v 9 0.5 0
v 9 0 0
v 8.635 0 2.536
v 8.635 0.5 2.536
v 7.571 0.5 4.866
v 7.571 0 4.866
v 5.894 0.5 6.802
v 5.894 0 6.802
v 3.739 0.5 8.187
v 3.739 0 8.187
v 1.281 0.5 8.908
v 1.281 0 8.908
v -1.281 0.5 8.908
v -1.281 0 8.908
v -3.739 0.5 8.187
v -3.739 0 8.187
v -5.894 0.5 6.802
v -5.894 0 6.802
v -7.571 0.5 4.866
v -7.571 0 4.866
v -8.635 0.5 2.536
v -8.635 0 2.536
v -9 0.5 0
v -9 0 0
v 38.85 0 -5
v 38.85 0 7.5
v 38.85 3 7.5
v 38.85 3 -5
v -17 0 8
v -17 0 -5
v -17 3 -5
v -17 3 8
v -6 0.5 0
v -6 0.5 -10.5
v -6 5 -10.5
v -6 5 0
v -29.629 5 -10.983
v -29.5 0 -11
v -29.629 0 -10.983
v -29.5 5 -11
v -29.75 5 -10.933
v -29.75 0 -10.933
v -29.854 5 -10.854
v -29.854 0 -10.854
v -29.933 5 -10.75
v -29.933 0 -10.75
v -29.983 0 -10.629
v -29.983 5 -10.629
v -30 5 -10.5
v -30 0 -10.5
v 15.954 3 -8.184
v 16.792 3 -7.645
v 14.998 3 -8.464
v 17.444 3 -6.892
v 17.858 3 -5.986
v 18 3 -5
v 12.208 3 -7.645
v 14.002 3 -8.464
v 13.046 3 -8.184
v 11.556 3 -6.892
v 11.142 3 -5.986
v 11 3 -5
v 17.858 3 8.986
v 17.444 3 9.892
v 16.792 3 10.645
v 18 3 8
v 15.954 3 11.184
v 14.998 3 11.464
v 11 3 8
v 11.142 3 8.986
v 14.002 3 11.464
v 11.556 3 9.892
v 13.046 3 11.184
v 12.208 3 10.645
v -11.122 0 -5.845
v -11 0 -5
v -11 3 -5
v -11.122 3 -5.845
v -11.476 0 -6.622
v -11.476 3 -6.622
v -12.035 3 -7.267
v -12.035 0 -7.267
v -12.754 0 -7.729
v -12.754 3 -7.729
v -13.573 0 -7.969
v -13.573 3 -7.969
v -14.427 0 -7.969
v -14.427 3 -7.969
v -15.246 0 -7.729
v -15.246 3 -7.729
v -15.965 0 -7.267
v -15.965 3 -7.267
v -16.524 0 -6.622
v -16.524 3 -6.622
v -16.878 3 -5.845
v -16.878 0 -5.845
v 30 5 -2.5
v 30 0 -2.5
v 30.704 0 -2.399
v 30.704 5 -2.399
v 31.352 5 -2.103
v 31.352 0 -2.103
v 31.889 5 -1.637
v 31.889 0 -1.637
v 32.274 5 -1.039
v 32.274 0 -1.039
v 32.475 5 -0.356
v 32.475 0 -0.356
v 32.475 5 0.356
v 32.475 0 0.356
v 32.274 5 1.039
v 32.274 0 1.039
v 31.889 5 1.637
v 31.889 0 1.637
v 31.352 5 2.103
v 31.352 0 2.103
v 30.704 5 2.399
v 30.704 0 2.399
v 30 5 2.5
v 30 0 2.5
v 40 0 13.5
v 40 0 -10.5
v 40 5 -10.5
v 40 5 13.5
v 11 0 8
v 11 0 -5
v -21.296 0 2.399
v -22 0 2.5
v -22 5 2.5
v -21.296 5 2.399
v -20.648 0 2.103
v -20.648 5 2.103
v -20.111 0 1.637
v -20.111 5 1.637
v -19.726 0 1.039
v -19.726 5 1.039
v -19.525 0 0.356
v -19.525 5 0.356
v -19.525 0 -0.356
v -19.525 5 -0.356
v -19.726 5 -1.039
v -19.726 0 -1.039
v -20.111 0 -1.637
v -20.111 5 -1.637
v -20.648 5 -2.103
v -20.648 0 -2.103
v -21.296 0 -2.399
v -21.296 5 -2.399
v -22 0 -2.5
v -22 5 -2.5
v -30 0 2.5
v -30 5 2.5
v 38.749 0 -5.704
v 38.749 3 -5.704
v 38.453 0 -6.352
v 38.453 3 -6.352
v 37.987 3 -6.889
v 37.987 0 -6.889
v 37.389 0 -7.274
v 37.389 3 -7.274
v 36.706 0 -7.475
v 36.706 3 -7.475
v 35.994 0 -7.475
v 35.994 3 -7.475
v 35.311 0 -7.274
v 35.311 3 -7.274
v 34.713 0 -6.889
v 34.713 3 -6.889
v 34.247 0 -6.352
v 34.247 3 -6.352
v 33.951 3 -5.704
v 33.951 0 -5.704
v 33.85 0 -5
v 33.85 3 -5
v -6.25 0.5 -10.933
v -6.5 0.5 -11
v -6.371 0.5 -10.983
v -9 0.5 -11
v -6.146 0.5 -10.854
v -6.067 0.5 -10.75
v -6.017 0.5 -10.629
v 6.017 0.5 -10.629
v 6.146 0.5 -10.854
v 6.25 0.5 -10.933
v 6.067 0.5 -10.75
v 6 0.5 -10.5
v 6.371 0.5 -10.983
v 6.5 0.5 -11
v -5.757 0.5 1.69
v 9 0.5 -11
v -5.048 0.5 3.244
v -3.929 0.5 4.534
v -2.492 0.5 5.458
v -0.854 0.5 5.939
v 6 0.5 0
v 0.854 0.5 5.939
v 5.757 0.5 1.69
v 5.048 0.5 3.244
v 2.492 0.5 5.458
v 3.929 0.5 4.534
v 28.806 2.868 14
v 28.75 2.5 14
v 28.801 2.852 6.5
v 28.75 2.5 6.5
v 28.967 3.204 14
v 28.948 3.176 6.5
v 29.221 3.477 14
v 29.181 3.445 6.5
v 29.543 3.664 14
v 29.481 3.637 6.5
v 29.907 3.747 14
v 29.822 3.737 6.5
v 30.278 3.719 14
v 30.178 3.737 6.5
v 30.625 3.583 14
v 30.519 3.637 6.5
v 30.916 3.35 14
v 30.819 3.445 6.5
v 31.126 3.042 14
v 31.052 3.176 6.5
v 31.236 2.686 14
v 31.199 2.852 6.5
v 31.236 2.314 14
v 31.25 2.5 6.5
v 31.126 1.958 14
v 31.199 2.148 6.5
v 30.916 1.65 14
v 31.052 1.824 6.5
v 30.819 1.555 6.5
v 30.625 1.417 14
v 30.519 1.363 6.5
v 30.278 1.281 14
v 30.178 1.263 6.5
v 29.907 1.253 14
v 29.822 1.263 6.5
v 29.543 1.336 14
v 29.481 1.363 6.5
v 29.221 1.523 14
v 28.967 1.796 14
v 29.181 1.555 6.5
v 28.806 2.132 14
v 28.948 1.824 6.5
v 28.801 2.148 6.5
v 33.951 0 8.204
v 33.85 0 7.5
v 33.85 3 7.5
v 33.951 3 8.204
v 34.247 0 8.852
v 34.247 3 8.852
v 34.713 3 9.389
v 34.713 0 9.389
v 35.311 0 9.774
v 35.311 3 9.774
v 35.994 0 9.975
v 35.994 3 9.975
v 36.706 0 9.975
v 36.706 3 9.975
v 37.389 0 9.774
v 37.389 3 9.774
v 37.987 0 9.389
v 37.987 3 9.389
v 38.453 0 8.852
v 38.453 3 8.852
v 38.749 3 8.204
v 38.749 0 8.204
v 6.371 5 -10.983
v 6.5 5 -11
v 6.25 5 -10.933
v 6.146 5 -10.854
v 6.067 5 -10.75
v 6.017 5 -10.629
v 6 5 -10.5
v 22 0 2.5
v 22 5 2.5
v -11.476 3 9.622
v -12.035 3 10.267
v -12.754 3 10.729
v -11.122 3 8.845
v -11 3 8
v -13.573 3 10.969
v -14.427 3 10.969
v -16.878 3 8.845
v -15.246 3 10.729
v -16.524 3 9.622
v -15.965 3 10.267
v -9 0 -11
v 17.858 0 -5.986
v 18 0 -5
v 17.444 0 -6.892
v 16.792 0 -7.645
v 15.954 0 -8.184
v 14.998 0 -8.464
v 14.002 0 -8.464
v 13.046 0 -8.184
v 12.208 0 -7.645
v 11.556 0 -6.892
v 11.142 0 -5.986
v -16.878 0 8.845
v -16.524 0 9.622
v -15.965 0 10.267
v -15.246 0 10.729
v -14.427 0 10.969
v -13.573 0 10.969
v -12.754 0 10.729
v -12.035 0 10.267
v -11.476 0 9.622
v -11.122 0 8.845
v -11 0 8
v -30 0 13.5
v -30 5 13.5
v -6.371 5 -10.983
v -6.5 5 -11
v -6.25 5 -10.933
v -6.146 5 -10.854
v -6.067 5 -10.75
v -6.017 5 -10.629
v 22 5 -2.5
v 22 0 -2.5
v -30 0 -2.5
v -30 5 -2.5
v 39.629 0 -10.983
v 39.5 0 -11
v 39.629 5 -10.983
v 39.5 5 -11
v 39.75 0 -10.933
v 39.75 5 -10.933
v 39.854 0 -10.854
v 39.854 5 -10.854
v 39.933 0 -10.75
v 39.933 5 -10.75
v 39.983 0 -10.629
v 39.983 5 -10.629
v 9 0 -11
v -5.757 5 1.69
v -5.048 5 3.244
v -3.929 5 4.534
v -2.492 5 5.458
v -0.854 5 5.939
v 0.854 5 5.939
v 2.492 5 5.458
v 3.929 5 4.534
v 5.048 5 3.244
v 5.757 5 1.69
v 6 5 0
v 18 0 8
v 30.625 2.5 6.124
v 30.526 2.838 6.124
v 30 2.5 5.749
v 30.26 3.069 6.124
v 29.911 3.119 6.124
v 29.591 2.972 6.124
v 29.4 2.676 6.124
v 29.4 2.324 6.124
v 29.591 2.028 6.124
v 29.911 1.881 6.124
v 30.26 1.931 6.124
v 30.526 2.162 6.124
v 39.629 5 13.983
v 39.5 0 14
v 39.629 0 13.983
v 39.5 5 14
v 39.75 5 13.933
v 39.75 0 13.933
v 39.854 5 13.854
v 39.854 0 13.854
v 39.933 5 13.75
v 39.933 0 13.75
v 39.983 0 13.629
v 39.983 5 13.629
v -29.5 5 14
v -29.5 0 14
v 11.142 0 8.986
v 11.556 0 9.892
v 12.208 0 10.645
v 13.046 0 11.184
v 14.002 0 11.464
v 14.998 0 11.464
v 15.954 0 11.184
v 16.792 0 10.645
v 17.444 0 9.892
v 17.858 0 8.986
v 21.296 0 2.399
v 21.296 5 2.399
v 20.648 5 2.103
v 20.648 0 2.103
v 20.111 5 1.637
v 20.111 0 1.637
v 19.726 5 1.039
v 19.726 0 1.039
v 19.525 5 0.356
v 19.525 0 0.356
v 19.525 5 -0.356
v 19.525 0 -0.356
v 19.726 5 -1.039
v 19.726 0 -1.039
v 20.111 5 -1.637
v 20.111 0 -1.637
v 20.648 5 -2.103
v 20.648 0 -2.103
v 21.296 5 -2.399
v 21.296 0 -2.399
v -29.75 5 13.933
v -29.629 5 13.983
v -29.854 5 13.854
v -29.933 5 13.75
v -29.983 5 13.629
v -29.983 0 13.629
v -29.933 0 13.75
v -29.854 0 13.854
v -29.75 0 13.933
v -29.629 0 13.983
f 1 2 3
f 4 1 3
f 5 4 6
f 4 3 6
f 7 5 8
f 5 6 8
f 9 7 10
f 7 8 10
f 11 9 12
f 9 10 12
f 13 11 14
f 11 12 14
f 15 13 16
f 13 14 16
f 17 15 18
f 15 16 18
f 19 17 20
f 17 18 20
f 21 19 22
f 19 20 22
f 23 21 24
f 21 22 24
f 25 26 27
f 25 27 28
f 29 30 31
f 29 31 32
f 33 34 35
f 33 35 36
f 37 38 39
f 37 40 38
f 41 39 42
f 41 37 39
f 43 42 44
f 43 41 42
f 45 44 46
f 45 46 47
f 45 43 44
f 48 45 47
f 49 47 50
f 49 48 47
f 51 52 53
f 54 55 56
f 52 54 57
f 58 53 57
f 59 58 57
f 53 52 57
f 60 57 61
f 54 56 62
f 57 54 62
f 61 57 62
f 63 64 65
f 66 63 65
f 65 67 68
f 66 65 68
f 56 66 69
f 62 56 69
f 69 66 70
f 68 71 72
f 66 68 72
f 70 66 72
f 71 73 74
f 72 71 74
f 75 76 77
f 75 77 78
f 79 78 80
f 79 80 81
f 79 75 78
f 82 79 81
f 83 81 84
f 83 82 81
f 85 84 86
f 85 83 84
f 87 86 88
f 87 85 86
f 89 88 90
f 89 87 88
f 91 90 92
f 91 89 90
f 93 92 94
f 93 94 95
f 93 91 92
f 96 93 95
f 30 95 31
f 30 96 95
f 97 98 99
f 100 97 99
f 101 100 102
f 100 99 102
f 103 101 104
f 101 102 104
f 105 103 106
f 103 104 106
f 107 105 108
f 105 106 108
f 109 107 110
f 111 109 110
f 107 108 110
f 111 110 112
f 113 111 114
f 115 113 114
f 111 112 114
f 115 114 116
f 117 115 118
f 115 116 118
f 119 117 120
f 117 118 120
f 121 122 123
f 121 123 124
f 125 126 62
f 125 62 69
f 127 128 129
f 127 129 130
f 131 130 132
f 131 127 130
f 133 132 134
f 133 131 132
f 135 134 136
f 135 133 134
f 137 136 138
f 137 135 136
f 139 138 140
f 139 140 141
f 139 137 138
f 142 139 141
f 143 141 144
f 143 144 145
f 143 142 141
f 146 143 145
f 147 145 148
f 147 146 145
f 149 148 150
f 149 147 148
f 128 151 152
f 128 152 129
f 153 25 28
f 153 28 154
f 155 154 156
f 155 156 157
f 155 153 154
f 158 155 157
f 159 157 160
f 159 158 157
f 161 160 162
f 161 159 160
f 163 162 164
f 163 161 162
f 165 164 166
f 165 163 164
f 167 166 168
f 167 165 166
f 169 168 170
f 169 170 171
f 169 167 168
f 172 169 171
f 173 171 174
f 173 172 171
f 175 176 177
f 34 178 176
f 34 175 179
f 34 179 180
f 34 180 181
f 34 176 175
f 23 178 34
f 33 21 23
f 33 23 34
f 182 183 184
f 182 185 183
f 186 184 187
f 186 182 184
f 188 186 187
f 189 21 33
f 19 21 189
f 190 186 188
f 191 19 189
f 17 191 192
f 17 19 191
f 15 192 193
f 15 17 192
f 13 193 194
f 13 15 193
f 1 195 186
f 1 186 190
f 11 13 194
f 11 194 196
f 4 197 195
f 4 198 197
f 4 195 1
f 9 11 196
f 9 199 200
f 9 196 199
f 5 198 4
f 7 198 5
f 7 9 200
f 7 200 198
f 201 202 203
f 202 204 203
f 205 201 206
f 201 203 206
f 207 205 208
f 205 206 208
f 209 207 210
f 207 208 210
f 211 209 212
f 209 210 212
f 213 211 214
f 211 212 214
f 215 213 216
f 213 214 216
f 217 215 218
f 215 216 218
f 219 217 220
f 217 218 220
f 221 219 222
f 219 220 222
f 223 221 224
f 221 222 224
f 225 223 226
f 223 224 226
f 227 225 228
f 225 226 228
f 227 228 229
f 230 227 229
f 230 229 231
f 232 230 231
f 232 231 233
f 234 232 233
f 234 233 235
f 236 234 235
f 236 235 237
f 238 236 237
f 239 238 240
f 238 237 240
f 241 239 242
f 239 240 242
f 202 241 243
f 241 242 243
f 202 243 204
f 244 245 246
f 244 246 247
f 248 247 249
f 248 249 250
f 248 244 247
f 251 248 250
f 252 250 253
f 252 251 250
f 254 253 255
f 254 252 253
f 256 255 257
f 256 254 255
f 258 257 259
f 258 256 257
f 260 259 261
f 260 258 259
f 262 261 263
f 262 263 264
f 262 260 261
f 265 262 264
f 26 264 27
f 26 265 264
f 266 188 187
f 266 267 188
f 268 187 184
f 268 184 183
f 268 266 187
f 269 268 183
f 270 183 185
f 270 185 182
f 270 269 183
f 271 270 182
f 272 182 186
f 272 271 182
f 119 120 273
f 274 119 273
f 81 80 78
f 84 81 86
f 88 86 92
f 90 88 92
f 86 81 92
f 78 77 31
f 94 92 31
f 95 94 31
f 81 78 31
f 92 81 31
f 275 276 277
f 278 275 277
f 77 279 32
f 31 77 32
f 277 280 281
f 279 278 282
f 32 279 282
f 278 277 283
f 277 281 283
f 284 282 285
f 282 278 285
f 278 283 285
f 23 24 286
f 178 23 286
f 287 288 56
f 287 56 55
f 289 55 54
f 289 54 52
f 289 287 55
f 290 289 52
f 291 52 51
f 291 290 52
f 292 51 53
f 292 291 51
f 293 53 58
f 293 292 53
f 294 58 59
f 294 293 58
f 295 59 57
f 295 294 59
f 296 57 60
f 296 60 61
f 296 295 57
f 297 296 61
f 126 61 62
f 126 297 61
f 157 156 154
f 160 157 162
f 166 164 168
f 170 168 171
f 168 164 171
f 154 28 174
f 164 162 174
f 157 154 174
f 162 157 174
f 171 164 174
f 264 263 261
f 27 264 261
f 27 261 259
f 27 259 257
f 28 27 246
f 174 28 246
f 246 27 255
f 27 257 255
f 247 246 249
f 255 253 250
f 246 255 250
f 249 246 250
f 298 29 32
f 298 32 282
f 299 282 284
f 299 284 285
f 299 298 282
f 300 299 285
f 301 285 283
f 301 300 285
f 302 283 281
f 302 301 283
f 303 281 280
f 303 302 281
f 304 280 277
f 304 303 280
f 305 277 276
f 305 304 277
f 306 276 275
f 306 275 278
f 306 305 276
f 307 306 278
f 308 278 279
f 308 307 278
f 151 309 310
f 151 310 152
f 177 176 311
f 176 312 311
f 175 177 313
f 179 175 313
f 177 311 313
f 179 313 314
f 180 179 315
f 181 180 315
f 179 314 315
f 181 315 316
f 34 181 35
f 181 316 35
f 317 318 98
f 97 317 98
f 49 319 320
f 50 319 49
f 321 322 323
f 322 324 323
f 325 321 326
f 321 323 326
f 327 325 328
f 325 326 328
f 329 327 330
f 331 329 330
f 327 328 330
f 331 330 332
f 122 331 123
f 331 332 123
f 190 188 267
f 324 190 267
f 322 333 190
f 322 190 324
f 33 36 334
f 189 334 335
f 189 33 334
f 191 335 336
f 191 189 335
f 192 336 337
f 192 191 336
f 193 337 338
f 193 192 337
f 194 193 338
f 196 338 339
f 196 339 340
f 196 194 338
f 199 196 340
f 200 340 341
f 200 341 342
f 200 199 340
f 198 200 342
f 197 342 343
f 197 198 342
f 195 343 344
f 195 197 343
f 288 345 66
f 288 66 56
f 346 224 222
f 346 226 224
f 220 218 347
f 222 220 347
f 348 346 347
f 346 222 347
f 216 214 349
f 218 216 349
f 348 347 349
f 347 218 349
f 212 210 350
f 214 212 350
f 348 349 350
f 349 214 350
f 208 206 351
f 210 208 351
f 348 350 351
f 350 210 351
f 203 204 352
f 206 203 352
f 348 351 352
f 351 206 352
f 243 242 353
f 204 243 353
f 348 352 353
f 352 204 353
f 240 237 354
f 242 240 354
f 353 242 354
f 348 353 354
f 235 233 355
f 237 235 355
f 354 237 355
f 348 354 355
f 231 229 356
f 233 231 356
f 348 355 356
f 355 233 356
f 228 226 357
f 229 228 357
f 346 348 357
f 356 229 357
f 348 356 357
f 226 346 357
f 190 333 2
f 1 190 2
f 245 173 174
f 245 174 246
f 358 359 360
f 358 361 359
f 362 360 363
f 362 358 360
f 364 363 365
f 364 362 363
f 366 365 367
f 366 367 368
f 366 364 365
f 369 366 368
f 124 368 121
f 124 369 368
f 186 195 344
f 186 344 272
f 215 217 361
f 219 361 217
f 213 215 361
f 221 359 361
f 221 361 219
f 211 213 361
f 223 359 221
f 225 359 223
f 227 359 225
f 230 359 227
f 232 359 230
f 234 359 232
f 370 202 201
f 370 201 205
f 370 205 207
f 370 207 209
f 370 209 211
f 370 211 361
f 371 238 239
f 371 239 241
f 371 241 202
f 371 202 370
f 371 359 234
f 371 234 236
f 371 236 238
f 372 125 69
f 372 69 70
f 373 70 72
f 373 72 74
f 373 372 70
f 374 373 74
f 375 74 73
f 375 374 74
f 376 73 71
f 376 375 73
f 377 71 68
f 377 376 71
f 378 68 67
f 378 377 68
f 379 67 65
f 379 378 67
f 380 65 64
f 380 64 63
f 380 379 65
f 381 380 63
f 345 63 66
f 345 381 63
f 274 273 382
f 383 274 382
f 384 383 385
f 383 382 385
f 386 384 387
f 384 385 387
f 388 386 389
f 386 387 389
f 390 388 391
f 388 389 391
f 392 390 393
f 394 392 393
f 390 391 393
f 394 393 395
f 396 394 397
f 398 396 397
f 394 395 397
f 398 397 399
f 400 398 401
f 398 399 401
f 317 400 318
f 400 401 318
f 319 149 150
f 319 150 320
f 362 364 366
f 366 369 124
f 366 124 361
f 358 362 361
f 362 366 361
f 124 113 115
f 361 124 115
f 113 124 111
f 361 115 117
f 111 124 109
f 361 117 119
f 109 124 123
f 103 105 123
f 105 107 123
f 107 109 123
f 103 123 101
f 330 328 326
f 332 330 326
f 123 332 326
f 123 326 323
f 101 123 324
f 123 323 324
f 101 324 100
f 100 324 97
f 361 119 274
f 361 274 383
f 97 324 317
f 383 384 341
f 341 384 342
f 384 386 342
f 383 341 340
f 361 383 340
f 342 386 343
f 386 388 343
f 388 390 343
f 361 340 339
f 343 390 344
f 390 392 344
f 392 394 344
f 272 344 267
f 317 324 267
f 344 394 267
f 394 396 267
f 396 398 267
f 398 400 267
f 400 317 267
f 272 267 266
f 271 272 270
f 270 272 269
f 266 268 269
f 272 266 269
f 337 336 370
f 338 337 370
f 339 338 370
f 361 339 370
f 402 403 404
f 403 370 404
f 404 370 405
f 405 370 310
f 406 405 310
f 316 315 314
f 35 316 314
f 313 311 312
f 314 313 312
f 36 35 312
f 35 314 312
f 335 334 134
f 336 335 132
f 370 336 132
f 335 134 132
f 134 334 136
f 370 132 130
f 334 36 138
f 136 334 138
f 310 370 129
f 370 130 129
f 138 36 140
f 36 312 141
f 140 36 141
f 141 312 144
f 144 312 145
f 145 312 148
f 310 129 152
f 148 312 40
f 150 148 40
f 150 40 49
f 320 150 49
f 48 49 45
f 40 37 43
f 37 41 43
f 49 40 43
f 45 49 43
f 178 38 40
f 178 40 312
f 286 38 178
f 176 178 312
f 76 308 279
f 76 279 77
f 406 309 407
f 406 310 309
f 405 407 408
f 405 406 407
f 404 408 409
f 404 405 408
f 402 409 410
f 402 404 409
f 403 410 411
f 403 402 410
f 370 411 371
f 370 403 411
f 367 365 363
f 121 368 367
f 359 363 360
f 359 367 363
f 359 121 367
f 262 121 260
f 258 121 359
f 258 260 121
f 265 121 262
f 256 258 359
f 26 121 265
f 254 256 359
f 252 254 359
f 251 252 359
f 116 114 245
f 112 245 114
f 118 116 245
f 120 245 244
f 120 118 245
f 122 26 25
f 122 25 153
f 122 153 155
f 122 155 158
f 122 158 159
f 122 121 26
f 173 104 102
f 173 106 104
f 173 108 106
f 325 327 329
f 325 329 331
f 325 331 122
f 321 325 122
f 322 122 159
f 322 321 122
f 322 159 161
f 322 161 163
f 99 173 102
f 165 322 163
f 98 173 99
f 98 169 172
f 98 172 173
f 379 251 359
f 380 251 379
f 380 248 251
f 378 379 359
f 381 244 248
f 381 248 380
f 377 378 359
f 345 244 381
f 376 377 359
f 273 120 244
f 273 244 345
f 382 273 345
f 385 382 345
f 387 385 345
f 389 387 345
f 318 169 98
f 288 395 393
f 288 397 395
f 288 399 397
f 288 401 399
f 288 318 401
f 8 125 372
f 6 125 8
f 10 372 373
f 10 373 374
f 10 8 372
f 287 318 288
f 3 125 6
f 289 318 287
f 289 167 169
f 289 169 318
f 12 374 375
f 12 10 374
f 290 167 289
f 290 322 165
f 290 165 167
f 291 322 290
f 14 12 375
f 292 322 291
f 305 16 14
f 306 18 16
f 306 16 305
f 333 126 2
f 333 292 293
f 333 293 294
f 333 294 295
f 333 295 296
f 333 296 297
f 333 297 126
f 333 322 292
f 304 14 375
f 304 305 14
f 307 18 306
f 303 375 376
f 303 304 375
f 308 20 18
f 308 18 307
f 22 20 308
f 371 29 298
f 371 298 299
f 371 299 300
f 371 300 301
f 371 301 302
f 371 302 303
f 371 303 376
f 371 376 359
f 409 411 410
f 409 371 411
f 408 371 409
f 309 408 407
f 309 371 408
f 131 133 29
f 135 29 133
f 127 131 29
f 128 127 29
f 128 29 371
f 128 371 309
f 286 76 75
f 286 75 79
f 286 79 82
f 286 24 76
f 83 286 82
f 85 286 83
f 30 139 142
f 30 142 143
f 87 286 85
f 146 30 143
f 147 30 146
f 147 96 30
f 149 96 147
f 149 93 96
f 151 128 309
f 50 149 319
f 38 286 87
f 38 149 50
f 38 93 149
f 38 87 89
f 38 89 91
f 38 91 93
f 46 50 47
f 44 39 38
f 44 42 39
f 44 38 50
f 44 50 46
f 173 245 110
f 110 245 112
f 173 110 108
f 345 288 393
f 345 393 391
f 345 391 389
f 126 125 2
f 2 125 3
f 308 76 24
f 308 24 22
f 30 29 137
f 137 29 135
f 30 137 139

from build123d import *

# Parameters (mm, degrees)
BOSS_EXTRUDE1_DEPTH       = 5
CUT_EXTRUDE1_DEPTH        = 0.5
CUT_EXTRUDE2_DEPTH        = 3
M3X0_5_TAPPED_HOLE1_D     = 2.5
M3X0_5_TAPPED_HOLE1_DEPTH = 7.5
M3X0_5_TAPPED_HOLE1_TIP   = 0.751075774
FILLET1_R                 = 0.5


with BuildPart() as part:
    # Sketch1 → Boss-Extrude1 (new body)
    with BuildSketch(Plane(origin=(0, 0, 0), x_dir=(1, 0, 0), z_dir=(0, 1, 0))):
        with BuildLine():
            Line((-30, 11), (-6, 11))
            Line((-6, 11), (-6, 0))
            ThreePointArc((-6, 0), (0, -6), (6, 0))
            Line((6, 0), (6, 11))
            Line((6, 11), (40, 11))
            Line((40, 11), (40, -14))
            Line((40, -14), (-30, -14))
            Line((-30, -14), (-30, -2.5))
            Line((-30, -2.5), (-22, -2.5))
            ThreePointArc((-22, -2.5), (-19.5, 0), (-22, 2.5))
            Line((-22, 2.5), (-30, 2.5))
            Line((-30, 2.5), (-30, 11))
        make_face()
        with BuildLine():
            Line((22, 2.5), (30, 2.5))
            ThreePointArc((30, 2.5), (32.5, 0), (30, -2.5))
            Line((30, -2.5), (22, -2.5))
            ThreePointArc((22, -2.5), (19.5, 0), (22, 2.5))
        make_face(mode=Mode.SUBTRACT)
    extrude(amount=BOSS_EXTRUDE1_DEPTH)

    # Sketch2 → Cut-Extrude1 (cut)
    with BuildSketch(Plane.XZ):
        with BuildLine():
            Line((-9, 0), (-9, -11))
            Line((-9, -11), (9, -11))
            Line((9, -11), (9, 0))
            ThreePointArc((9, 0), (0, 9), (-9, 0))
        make_face()
    extrude(amount=-CUT_EXTRUDE1_DEPTH, mode=Mode.SUBTRACT)

    # Sketch3 → Cut-Extrude2 (cut)
    with BuildSketch(Plane.XZ):
        with BuildLine():
            Line((-11, 8), (-11, -5))
            ThreePointArc((-11, -5), (-14, -8), (-17, -5))
            Line((-17, -5), (-17, 8))
            ThreePointArc((-17, 8), (-14, 11), (-11, 8))
        make_face()
        with BuildLine():
            Line((18, 8), (18, -5))
            ThreePointArc((18, -5), (14.5, -8.5), (11, -5))
            Line((11, -5), (11, 8))
            ThreePointArc((11, 8), (14.5, 11.5), (18, 8))
        make_face()
        with BuildLine():
            Line((38.85, 7.5), (38.85, -5))
            ThreePointArc((38.85, -5), (36.35, -7.5), (33.85, -5))
            Line((33.85, -5), (33.85, 7.5))
            ThreePointArc((33.85, 7.5), (36.35, 10), (38.85, 7.5))
        make_face()
    extrude(amount=-CUT_EXTRUDE2_DEPTH, mode=Mode.SUBTRACT)

    # M3x0.5 Tapped Hole1
    with Locations(Plane.XY.offset(14)):
        with Locations((30, 2.5)):
            Hole(M3X0_5_TAPPED_HOLE1_D / 2, depth=M3X0_5_TAPPED_HOLE1_DEPTH)
            with Locations((0, 0, -(M3X0_5_TAPPED_HOLE1_DEPTH + M3X0_5_TAPPED_HOLE1_TIP / 2))):  # 118° drill point
                Cone(0, M3X0_5_TAPPED_HOLE1_D / 2, M3X0_5_TAPPED_HOLE1_TIP, mode=Mode.SUBTRACT)

    # Fillet1
    fillet1_edges = [part.edges().sort_by_distance(p)[0] for p in [
        (40, 2.5, -11),
        (40, 2.5, 14),
        (-30, 2.5, 14),
        (-30, 2.5, -11),
        (-6, 2.75, -11),
        (6, 2.75, -11),
    ]]
    fillet(fillet1_edges, radius=FILLET1_R)


solid = part.part
